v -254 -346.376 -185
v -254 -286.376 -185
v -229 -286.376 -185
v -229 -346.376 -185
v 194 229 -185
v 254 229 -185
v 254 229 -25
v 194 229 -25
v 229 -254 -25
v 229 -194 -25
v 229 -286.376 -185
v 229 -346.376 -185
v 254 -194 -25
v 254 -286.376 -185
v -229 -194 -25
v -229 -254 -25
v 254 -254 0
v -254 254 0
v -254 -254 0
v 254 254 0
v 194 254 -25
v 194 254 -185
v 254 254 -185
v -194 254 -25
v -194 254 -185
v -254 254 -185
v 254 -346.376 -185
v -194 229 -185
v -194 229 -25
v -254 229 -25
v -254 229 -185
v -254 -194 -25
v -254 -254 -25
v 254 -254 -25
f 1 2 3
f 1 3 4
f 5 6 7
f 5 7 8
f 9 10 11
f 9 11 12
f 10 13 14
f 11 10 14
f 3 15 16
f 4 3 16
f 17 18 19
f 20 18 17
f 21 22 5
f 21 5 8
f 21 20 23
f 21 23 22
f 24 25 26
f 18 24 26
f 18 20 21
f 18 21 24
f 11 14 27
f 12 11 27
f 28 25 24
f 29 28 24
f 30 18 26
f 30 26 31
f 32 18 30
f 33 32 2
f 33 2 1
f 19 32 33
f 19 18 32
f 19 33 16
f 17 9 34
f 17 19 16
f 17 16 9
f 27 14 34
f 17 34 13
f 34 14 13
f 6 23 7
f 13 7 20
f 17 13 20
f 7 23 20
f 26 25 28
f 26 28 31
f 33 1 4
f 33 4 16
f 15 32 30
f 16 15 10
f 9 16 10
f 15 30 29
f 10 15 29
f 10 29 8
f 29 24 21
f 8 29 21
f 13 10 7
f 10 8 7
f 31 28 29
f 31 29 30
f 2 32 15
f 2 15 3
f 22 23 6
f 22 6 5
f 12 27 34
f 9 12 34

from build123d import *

# Parameters (mm, degrees)
F0_W     = 508
F0_H     = 508
F1_DEPTH = 25
F3_DEPTH = 25
F5_W     = 60
F5_H     = 160
F6_DEPTH = 25


with BuildPart() as f1:
    # F0 (on Top) → F1 (new body)
    with BuildSketch(Plane.XY):
        Rectangle(F0_W, F0_H)
    extrude(amount=-F1_DEPTH)

    # F2 (on face) → F3 (join)
    with BuildSketch(Plane(origin=(-254, 0, 0), x_dir=(0, -1, 0), z_dir=(-1, 0, 0))):
        Polygon((254, -25), (194, -25), (286.3760430703, -185), (346.3760430703, -185), align=None)
    extrude(amount=-F3_DEPTH)

    # F4: F1 across plane


with BuildPart() as f1_1:
    add(f1.part)
    add(f1.part.mirror(Plane.YZ))

    # F5 (on face) → F6 (join)
    with BuildSketch(Plane(origin=(0, 254, 0), x_dir=(-1, 0, 0), z_dir=(0, 1, 0))):
        with Locations((-224, -105)):
            Rectangle(F5_W, F5_H)
        with Locations((224, -105)):
            Rectangle(F5_W, F5_H)
    extrude(amount=-F6_DEPTH)


solid = f1_1.part
